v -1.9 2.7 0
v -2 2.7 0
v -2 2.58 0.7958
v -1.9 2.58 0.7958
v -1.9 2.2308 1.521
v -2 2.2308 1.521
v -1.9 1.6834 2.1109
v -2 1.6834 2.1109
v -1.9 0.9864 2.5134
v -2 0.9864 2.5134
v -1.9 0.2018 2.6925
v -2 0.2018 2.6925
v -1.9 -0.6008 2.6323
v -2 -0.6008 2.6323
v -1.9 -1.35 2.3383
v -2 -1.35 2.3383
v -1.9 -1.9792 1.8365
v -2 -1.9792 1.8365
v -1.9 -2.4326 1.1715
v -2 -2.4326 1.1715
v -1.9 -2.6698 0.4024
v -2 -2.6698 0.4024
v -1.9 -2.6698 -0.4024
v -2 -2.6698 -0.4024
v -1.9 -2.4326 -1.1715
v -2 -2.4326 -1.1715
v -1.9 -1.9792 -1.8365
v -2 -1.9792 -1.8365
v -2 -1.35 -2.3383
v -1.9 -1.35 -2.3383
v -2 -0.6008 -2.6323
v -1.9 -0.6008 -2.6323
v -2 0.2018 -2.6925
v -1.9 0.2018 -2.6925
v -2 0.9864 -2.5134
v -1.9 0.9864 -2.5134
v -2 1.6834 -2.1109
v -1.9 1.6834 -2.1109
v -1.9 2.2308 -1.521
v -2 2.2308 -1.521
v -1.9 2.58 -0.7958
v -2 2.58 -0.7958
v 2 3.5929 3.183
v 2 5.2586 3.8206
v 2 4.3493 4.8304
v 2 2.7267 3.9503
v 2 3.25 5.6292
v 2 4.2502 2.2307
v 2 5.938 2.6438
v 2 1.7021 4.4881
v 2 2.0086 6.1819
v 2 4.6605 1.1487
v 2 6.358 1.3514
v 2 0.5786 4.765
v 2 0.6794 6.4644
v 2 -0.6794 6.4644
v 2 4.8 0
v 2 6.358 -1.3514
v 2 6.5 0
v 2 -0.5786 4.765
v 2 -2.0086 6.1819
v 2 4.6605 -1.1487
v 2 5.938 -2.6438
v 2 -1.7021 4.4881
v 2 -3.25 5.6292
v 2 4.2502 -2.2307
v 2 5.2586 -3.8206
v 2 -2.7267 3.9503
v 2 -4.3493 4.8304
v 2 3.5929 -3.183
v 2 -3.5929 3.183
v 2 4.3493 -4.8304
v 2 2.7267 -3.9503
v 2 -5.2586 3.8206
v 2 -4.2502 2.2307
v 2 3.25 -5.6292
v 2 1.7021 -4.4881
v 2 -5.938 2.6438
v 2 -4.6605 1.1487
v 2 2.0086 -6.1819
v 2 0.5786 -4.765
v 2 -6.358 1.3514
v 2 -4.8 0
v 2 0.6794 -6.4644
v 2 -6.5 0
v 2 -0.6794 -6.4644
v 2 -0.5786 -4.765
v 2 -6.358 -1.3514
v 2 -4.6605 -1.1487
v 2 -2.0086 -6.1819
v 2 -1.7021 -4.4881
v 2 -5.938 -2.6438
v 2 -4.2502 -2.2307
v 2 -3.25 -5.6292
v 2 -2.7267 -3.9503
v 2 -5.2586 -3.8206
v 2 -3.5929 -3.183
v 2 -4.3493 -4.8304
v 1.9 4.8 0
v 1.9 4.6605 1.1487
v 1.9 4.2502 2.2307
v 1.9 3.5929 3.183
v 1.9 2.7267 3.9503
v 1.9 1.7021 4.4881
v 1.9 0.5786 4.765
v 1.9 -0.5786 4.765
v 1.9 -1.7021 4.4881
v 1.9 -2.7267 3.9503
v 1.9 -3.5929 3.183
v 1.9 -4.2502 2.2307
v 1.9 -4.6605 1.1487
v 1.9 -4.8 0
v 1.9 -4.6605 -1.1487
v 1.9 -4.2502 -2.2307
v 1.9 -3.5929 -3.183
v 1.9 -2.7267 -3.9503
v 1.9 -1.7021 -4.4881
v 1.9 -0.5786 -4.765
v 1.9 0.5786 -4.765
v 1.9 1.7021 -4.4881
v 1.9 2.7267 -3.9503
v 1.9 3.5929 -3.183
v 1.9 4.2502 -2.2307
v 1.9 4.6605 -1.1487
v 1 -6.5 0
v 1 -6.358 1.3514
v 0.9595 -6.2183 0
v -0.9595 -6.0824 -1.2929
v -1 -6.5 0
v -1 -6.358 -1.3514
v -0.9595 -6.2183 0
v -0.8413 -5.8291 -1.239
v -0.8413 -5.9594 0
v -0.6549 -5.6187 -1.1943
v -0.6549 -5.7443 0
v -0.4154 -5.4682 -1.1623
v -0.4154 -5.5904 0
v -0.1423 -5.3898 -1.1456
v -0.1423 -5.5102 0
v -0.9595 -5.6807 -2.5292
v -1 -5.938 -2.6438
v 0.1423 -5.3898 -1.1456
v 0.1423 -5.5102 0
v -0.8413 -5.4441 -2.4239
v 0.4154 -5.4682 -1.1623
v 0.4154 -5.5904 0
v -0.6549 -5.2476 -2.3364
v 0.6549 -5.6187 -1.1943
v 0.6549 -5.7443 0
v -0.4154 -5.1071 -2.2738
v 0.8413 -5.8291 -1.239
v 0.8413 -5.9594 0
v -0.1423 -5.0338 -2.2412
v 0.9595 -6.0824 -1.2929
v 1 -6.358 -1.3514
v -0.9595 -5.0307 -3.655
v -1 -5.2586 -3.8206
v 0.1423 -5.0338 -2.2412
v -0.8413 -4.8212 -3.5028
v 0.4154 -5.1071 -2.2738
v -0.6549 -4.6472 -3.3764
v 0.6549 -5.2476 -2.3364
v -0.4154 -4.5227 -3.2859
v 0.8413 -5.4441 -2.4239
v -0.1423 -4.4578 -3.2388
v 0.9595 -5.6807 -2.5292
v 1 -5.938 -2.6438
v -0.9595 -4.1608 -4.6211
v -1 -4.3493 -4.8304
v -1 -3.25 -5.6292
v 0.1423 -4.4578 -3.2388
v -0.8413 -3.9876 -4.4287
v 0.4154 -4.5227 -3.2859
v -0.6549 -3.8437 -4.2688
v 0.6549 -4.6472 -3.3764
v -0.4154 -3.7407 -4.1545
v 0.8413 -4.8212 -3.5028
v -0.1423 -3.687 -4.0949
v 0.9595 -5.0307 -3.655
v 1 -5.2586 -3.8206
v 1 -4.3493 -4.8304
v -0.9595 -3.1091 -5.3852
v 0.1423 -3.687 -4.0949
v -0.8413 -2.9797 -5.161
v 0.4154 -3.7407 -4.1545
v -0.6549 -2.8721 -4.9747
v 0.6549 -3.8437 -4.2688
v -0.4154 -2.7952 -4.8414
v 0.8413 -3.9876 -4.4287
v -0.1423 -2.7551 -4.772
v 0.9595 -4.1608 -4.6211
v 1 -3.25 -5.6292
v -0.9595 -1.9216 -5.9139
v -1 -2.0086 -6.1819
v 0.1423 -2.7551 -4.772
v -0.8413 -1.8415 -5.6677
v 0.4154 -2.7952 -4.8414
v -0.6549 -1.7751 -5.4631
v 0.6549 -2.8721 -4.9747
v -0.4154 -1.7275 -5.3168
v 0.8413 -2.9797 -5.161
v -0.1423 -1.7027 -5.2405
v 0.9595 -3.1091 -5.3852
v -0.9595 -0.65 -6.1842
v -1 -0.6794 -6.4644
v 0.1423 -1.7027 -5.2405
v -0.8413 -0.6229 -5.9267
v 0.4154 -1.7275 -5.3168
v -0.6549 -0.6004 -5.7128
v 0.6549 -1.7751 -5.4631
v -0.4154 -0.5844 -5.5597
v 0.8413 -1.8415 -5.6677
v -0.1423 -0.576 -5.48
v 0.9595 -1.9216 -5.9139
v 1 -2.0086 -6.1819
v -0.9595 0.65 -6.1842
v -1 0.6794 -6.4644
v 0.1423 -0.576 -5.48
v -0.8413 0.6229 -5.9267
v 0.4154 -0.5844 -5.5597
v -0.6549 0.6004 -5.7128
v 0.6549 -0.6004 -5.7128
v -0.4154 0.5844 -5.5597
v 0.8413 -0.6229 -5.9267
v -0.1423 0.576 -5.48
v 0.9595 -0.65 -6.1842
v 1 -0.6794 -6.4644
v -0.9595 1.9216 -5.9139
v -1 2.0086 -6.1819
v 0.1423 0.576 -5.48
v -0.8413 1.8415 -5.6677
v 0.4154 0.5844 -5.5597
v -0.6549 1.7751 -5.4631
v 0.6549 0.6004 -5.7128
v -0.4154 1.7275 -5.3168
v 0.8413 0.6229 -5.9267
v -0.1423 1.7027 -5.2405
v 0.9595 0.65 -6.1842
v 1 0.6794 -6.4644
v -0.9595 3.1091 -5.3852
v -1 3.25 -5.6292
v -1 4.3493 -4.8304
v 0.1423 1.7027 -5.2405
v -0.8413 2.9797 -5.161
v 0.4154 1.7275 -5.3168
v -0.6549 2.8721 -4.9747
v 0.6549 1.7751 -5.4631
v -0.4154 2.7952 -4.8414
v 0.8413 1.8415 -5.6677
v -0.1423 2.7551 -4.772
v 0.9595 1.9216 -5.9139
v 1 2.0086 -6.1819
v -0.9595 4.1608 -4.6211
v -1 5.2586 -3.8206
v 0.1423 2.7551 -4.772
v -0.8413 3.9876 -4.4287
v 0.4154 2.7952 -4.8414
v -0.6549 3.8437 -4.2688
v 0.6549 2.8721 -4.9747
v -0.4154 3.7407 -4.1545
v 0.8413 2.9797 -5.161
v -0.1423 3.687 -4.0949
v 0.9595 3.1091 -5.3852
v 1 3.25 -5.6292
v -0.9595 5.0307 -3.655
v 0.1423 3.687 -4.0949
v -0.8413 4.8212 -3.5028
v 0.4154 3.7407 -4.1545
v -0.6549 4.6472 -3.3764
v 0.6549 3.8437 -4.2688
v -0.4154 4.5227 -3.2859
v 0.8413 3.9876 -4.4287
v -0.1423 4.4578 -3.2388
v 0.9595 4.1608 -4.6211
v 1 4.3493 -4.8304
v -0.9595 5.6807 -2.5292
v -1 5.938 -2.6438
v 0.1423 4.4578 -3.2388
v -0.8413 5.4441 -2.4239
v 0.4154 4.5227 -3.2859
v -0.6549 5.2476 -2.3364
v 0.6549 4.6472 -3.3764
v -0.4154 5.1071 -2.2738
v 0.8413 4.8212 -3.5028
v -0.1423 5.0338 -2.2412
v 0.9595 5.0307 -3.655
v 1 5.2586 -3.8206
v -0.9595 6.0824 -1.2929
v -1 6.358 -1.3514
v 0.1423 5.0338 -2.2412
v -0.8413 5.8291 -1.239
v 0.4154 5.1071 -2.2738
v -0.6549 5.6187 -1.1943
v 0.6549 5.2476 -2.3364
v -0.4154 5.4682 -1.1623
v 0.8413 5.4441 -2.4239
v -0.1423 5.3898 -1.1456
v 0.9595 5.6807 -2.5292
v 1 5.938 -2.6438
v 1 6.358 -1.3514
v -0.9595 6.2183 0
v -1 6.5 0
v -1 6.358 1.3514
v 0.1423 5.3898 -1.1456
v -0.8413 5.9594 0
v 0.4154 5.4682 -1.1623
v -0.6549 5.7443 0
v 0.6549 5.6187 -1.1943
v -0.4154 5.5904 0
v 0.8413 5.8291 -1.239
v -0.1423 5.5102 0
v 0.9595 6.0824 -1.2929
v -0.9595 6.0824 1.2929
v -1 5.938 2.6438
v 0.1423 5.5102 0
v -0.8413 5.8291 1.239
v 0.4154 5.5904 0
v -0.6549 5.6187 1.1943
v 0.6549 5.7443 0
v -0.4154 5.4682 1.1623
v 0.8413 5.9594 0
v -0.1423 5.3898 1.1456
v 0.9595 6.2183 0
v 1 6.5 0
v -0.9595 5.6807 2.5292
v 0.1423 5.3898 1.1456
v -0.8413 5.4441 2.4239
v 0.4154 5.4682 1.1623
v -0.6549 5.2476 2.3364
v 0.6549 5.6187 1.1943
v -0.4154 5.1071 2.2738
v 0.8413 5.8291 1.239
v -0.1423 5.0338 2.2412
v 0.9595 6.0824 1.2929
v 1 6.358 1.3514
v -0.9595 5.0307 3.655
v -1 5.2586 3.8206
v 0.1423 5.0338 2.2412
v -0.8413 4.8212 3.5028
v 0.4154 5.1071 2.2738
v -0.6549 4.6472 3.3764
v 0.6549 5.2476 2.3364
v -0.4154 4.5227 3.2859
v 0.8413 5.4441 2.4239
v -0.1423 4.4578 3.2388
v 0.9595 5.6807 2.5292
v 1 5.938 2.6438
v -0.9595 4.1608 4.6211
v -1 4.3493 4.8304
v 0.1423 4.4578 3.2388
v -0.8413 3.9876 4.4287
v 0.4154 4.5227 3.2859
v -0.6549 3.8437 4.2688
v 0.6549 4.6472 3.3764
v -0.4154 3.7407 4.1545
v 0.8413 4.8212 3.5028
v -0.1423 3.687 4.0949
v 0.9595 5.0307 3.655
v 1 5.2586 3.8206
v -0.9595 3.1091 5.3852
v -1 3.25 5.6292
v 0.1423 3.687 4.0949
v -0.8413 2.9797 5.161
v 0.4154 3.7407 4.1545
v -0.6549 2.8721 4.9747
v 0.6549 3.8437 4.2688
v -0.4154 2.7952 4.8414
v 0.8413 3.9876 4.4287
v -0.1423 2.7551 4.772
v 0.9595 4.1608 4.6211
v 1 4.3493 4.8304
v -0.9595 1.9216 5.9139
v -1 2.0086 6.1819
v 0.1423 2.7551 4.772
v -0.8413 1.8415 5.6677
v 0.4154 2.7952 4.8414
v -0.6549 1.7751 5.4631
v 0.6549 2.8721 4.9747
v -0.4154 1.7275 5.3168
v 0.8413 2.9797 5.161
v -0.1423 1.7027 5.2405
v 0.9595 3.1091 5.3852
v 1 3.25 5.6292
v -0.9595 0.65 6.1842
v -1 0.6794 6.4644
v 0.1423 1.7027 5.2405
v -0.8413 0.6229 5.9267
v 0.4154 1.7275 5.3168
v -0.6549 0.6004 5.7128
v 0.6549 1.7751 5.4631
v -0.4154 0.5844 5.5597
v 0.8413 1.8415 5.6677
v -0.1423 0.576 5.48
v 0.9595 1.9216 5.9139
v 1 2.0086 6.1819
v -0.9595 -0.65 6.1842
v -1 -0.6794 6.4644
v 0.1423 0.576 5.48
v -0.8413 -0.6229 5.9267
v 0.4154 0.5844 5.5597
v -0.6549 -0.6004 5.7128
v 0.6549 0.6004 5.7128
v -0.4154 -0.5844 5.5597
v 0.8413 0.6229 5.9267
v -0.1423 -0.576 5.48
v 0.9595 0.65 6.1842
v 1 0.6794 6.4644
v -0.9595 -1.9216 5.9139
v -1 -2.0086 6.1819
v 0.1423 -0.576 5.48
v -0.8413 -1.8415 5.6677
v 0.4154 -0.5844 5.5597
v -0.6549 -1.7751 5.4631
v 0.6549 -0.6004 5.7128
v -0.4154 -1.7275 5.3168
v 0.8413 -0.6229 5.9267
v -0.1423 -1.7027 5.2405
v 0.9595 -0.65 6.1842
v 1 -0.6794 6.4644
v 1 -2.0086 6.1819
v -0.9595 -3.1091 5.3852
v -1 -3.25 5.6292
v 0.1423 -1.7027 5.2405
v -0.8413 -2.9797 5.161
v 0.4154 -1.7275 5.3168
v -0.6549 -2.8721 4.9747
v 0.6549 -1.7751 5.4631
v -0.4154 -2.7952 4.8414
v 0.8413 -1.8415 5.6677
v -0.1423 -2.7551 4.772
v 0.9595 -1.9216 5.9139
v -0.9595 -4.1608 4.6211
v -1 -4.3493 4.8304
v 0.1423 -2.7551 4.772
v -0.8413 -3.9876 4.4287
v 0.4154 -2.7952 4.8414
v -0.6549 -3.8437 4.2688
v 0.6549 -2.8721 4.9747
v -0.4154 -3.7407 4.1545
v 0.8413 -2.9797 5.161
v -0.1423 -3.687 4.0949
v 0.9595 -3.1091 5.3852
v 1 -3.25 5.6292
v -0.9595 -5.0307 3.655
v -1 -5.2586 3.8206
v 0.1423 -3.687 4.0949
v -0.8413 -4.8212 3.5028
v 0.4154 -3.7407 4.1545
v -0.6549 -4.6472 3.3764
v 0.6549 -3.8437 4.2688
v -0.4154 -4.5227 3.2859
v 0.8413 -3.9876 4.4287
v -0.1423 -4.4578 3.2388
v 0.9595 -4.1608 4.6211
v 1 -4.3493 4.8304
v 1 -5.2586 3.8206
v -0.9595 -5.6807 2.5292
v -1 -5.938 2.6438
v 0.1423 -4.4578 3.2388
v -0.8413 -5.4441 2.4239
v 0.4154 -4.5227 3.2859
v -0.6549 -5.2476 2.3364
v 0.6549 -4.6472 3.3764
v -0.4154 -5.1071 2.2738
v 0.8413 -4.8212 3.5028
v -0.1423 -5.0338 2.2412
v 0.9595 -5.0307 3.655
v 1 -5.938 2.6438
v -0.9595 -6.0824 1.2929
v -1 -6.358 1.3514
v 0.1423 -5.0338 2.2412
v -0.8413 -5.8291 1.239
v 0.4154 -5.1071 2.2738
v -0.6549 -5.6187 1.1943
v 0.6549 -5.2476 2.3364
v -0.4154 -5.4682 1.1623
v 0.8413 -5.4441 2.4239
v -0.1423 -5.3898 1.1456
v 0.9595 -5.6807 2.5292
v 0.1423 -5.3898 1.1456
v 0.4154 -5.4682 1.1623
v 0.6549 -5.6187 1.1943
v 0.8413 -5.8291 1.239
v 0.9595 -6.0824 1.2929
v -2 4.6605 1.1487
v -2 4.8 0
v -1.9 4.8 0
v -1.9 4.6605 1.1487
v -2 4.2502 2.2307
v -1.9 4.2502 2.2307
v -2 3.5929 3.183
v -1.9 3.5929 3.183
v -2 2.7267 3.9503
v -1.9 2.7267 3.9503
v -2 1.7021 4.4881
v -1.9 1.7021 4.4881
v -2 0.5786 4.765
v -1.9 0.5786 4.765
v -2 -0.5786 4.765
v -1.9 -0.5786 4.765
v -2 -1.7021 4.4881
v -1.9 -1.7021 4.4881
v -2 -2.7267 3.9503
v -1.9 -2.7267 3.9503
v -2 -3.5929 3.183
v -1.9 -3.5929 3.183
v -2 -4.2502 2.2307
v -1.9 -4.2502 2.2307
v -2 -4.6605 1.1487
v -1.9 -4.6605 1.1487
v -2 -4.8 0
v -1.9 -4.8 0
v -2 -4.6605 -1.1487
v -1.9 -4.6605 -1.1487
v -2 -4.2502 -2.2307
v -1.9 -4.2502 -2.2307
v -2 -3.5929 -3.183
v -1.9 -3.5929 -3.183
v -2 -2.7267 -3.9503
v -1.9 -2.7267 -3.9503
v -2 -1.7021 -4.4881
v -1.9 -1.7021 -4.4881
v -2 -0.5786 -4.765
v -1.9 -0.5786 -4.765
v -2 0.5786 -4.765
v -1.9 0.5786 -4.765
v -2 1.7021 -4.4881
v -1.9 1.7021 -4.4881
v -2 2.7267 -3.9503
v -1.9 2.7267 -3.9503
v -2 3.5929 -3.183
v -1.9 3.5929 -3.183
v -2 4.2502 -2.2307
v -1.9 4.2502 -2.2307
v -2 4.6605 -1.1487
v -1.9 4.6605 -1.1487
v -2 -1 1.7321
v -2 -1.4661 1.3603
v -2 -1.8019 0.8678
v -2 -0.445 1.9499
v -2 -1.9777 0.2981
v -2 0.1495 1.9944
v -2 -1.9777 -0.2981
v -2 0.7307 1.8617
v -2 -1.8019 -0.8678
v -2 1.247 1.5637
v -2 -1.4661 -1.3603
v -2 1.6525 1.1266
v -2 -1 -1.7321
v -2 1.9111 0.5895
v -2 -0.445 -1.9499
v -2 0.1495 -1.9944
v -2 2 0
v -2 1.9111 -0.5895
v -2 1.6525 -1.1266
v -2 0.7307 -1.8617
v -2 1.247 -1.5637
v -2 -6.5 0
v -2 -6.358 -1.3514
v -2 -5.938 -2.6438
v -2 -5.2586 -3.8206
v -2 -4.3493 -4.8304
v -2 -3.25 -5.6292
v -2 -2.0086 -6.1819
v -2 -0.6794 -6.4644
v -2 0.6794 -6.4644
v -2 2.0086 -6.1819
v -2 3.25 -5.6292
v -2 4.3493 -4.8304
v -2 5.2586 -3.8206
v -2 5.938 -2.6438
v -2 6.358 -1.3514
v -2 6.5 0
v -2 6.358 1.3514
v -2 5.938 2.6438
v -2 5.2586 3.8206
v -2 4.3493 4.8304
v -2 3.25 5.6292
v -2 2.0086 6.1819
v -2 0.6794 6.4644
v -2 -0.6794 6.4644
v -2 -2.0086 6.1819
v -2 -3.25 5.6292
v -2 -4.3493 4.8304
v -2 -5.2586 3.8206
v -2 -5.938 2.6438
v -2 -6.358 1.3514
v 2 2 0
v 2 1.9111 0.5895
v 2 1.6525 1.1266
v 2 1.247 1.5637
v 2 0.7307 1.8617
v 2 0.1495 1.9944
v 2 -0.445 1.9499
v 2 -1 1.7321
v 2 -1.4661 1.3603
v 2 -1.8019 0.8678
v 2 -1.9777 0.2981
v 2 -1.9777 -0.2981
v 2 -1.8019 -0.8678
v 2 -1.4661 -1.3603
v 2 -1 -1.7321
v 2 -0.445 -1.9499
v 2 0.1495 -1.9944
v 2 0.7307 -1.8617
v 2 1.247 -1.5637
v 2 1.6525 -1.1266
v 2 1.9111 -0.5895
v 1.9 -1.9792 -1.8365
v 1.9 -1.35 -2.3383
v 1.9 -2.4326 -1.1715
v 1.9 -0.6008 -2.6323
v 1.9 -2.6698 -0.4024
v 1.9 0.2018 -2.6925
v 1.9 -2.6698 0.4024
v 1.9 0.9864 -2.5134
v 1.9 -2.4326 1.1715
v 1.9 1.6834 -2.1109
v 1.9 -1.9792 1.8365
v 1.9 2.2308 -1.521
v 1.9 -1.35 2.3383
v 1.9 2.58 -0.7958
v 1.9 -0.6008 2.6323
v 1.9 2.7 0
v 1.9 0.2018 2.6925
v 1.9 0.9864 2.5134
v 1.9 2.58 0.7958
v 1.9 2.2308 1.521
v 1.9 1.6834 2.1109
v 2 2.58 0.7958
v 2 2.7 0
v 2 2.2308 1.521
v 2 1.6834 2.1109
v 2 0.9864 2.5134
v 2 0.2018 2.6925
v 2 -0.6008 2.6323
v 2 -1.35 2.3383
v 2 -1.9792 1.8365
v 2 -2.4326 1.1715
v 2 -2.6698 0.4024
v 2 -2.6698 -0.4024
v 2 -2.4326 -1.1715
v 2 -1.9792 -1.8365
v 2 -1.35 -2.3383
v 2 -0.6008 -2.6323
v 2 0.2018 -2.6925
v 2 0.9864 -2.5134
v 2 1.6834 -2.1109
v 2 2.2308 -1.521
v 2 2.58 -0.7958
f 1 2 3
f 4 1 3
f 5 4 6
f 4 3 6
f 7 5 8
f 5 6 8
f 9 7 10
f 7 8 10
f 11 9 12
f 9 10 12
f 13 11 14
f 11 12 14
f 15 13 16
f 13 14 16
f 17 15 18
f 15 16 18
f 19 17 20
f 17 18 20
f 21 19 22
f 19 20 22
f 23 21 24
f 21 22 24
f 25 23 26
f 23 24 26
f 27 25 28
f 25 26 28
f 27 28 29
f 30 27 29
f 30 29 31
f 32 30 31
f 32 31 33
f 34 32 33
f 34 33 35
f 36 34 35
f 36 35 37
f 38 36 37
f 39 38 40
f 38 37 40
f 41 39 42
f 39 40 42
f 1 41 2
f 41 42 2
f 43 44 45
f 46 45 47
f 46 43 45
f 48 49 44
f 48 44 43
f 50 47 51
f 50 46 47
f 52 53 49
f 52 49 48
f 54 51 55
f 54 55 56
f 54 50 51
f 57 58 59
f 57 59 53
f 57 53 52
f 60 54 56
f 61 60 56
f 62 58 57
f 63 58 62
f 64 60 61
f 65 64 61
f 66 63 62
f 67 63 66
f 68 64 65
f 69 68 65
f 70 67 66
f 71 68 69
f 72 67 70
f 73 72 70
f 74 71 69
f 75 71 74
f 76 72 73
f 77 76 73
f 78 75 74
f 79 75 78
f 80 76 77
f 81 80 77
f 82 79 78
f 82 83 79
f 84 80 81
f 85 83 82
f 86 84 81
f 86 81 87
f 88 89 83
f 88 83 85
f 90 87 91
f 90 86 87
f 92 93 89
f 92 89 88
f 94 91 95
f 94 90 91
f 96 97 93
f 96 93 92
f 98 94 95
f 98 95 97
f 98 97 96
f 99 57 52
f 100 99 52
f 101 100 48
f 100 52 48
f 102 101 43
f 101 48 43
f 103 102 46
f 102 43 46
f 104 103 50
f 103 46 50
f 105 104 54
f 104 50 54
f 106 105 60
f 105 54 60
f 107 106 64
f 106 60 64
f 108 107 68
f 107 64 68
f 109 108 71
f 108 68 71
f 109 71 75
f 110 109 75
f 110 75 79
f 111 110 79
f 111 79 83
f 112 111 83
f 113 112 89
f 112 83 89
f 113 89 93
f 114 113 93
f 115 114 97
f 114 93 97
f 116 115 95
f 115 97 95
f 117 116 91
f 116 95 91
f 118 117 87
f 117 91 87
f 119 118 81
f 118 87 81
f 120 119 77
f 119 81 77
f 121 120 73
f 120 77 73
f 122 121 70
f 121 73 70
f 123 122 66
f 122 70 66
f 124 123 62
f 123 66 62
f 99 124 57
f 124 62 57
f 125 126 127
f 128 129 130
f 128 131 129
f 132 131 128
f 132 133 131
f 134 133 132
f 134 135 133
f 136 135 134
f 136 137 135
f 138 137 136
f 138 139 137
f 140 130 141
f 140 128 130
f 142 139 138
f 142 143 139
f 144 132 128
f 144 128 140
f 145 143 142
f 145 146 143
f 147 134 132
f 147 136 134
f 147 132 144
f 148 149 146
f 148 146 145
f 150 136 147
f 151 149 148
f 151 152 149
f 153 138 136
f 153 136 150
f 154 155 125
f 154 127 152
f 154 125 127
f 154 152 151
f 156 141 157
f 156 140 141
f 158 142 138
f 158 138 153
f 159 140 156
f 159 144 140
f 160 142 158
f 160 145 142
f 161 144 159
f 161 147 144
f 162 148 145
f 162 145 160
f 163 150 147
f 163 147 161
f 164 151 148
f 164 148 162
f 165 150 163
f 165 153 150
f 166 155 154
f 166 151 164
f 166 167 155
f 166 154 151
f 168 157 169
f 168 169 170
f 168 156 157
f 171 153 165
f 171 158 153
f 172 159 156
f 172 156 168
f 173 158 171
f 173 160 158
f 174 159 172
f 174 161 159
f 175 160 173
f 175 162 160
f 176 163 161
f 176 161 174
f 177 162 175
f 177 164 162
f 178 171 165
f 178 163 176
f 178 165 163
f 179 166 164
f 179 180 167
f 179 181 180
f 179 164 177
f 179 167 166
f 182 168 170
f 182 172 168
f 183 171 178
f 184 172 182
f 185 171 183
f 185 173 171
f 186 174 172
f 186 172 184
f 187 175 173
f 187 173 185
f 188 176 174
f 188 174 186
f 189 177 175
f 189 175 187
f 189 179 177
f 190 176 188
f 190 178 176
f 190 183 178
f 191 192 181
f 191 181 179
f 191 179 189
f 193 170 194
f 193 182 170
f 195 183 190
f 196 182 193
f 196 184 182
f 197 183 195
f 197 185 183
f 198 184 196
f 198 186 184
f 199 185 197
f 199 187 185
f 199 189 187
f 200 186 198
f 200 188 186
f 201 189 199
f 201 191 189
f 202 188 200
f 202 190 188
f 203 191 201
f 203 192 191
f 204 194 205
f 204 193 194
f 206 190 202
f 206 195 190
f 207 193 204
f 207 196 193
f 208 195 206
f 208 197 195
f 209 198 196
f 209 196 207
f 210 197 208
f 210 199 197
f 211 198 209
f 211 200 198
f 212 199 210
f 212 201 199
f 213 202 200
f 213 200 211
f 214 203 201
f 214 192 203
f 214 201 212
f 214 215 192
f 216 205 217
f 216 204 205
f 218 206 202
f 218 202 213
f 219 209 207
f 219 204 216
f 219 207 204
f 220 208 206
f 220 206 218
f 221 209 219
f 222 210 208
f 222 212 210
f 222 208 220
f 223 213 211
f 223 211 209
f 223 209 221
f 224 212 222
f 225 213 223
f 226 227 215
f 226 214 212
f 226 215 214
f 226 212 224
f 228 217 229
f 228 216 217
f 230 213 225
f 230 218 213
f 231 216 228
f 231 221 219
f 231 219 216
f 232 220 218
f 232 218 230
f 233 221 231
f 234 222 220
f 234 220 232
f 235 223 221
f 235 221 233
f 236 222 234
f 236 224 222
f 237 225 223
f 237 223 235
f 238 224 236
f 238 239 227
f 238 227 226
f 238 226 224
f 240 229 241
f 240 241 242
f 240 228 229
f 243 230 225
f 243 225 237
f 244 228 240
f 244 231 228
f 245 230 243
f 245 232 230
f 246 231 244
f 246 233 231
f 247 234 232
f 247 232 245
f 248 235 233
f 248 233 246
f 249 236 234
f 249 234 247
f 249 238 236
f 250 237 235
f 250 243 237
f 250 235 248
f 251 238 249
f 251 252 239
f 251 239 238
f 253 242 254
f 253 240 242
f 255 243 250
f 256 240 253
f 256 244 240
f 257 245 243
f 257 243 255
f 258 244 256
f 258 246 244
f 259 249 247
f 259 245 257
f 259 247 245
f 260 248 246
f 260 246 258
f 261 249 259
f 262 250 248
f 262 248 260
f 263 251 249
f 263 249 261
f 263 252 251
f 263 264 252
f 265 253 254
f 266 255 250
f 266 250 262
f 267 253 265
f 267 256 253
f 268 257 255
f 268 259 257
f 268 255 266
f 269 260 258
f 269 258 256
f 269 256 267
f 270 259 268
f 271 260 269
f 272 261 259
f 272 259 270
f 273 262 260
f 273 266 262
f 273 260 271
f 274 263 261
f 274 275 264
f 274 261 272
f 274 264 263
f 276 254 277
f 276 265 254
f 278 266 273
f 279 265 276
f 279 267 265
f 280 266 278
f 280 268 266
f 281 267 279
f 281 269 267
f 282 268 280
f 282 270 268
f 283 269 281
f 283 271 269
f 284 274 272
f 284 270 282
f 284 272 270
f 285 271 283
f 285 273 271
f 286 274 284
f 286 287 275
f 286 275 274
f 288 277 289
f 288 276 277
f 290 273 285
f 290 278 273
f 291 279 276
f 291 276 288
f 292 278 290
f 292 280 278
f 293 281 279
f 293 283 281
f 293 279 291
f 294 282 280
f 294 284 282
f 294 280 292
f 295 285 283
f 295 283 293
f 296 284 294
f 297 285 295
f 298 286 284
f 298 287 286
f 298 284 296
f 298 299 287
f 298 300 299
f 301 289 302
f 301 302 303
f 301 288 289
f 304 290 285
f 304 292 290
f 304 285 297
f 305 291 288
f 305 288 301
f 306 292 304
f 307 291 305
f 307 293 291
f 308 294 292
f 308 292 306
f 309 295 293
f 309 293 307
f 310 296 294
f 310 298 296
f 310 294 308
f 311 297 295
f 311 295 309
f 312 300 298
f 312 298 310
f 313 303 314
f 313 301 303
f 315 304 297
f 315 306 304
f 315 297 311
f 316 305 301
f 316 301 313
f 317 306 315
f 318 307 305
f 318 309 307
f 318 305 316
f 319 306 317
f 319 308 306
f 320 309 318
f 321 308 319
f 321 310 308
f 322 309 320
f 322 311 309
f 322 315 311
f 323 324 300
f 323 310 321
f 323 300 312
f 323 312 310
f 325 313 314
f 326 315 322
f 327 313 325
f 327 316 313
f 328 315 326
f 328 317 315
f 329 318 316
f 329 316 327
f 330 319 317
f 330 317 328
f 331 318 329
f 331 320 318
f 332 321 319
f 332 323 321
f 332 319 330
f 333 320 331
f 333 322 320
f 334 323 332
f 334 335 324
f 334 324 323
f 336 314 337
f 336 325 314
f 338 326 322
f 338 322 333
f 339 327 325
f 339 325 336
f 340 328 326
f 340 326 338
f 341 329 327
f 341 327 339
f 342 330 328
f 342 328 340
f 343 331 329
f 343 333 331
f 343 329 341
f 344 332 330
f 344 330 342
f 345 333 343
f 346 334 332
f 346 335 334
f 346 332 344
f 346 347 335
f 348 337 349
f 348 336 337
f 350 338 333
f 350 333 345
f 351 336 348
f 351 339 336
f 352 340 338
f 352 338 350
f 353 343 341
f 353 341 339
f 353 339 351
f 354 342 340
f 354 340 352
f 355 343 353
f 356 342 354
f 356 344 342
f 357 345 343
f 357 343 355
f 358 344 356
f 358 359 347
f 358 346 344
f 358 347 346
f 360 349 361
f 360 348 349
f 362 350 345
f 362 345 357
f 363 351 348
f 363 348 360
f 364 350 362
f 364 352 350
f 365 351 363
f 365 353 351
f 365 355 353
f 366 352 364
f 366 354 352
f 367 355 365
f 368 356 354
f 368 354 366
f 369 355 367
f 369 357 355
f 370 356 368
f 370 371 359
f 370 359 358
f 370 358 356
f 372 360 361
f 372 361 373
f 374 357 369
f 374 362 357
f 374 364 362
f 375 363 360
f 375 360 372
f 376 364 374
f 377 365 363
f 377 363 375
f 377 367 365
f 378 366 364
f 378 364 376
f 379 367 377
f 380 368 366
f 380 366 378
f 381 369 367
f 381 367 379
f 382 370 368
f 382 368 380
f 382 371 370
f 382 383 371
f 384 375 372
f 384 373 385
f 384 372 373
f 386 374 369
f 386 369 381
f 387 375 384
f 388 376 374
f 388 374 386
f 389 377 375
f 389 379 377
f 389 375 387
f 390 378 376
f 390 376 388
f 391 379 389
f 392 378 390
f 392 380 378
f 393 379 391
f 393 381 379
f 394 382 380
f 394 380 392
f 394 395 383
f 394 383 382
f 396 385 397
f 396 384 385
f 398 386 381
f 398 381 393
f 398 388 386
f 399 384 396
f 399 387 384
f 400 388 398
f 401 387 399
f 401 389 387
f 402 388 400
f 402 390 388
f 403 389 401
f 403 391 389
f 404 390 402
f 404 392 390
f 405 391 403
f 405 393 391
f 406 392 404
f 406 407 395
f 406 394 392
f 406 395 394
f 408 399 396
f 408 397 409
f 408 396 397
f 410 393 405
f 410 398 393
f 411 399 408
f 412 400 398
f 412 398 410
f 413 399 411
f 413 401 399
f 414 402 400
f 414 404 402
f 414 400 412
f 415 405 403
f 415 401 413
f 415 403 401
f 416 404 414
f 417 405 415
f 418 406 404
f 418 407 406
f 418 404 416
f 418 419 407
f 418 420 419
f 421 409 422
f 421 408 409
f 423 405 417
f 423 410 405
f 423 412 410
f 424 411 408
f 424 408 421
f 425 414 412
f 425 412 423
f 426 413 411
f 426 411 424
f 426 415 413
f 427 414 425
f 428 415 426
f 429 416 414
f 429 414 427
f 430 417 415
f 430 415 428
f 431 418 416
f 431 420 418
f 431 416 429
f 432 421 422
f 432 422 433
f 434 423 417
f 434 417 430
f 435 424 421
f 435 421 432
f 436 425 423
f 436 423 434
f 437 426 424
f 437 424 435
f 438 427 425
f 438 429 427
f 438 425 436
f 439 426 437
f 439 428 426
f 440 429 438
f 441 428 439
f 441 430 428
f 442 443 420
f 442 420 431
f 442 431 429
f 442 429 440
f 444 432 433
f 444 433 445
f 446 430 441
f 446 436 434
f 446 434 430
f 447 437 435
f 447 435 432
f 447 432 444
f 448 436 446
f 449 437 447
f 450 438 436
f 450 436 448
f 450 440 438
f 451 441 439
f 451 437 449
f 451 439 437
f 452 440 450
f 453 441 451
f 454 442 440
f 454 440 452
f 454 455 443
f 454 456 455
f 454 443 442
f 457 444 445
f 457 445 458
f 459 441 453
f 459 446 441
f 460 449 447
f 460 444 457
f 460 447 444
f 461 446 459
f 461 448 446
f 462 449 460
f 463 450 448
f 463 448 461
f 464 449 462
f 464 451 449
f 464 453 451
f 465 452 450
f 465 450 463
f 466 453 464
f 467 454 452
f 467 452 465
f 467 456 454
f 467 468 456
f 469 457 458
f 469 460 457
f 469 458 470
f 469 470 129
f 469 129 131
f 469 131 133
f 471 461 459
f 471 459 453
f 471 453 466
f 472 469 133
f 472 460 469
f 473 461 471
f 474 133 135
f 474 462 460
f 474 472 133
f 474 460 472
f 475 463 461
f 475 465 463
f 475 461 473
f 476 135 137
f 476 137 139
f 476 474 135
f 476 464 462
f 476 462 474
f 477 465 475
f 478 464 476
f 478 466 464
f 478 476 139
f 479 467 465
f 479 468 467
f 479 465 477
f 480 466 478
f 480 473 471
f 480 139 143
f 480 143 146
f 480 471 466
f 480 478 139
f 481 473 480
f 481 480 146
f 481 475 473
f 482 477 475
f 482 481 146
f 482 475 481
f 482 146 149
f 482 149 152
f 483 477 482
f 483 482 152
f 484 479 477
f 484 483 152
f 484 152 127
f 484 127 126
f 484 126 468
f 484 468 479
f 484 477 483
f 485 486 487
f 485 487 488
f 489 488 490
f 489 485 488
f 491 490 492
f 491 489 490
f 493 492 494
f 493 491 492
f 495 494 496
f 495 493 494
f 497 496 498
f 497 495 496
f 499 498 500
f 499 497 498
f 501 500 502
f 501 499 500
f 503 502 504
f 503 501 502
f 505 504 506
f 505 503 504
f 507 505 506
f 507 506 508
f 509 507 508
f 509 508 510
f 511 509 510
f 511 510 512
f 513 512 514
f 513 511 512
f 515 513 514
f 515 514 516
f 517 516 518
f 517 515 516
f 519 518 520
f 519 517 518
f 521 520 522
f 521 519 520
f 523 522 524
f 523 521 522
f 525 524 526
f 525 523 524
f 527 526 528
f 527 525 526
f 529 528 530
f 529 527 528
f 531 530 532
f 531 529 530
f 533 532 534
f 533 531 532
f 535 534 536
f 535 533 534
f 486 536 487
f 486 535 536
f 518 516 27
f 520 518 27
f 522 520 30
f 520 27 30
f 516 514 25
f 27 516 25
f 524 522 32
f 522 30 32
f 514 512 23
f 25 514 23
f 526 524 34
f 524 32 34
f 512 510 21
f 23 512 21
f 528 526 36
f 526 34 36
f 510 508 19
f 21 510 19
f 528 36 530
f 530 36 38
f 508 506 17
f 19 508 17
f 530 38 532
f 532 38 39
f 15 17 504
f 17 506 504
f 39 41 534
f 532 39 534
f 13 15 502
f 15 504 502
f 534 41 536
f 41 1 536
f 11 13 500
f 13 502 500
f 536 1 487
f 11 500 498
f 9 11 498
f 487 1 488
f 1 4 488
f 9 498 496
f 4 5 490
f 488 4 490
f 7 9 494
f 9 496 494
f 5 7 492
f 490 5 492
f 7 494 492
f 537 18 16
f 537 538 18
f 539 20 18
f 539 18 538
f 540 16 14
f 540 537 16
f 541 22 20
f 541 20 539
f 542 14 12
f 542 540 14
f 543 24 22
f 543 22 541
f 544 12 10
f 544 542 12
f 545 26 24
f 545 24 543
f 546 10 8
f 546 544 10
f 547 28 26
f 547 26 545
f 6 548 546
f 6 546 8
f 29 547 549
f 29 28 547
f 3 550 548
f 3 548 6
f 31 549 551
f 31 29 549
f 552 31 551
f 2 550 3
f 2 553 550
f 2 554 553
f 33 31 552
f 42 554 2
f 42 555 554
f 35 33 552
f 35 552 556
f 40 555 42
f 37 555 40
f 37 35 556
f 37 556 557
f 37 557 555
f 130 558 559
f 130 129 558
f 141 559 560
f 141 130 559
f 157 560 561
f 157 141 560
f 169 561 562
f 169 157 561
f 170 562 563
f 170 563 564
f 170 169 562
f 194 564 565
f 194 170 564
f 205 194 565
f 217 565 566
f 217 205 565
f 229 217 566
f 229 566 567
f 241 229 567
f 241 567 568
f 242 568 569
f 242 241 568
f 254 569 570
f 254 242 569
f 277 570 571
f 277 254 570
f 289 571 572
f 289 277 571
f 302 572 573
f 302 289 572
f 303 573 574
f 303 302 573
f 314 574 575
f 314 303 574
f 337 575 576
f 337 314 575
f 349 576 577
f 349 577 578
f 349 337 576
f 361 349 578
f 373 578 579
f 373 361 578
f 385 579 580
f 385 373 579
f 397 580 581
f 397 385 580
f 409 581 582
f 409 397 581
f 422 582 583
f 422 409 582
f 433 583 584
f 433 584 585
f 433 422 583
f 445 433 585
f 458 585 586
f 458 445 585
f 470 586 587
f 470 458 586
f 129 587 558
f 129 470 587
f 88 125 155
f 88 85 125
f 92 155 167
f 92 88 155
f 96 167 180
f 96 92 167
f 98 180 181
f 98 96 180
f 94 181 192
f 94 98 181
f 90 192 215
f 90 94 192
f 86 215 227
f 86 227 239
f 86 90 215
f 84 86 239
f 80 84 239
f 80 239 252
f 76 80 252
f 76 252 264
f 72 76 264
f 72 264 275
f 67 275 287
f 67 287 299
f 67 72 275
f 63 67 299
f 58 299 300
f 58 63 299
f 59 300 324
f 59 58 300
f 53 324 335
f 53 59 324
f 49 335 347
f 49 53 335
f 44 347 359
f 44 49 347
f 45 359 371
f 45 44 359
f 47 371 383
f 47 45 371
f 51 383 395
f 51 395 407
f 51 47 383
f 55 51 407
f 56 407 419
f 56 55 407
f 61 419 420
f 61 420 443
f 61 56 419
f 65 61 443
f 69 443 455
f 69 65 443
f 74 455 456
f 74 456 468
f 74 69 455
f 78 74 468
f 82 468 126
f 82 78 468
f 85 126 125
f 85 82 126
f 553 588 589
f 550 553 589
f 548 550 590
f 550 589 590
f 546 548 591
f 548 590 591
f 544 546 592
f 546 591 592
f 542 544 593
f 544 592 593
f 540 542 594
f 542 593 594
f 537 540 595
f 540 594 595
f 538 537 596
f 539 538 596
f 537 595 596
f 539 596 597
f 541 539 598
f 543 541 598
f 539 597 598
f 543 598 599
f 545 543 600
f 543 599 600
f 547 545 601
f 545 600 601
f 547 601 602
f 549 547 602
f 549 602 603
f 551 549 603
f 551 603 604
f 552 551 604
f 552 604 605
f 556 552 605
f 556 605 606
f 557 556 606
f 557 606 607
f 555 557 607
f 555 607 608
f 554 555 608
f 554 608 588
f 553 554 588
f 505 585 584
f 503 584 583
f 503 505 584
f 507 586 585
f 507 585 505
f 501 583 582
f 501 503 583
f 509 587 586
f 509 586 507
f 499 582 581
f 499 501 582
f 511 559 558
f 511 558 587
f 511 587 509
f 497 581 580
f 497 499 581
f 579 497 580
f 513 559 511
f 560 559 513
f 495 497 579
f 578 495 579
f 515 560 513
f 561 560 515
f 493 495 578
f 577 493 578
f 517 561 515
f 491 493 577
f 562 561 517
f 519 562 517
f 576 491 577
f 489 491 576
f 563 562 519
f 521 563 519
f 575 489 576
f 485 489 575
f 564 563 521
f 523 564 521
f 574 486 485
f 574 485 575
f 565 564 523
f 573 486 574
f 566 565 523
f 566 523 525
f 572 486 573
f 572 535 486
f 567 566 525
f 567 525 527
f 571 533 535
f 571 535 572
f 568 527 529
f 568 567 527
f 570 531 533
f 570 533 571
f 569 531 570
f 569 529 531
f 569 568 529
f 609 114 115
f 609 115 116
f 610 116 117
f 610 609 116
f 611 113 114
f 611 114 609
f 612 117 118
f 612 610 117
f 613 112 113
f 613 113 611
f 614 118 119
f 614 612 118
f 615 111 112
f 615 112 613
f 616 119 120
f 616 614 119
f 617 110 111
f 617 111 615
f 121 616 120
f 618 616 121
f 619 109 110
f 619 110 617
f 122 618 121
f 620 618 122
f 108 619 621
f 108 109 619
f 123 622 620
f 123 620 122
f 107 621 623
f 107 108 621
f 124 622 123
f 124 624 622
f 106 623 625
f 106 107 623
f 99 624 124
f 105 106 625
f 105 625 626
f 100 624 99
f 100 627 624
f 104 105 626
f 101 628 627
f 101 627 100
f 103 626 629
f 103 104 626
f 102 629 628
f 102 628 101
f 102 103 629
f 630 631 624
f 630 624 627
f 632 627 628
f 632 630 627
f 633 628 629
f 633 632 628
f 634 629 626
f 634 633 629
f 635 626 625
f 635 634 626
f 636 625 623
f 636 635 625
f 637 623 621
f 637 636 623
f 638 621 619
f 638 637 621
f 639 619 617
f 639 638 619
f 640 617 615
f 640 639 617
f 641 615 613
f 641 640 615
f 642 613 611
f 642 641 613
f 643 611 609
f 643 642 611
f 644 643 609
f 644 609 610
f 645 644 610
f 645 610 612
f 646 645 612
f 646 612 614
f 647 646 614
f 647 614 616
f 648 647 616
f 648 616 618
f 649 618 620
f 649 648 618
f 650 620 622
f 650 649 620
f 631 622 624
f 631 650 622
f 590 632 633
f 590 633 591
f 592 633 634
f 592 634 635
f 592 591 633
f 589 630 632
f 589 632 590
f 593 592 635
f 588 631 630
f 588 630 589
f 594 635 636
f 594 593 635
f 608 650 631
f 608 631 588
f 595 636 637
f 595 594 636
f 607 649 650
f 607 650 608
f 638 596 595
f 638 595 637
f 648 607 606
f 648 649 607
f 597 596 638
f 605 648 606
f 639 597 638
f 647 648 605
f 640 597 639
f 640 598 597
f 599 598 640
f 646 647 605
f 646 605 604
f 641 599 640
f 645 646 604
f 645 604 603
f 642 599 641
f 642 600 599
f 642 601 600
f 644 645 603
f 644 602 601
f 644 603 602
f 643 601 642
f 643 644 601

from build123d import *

# Parameters (mm, degrees)
SKETCH2_R          = 2
CUT_EXTRUDE1_DEPTH = 11.024968828
SKETCH3_R          = 4.8
SKETCH3_R_2        = 2.7
CUT_EXTRUDE2_DEPTH = 0.1


with BuildPart() as part:
    # Sketch1 → Revolve1 (revolve)
    with BuildSketch(Plane.XY, mode=Mode.PRIVATE) as revolve1_sk:
        with BuildLine():
            Line((1, 6.5), (2, 6.5))
            Line((2, 6.5), (2, 0))
            Line((2, 0), (-2, 0))
            Line((-2, 0), (-2, 6.5))
            Line((-2, 6.5), (-1, 6.5))
            ThreePointArc((-1, 6.5), (0, 5.5), (1, 6.5))
        make_face()
    revolve(revolve1_sk.sketch.rotate(Axis((2, 0, 0), (1, 0, 0)), 180), axis=Axis((2, 0, 0), (1, 0, 0)))

    # Sketch2 → Cut-Extrude1 (cut, through all)
    with BuildSketch(Plane(origin=(2, 0, 0), x_dir=(0, 0, -1), z_dir=(1, 0, 0))):
        with Locations(Location((0, 0, 0), (0, 0, 90))):
            Circle(SKETCH2_R)
    extrude(amount=-CUT_EXTRUDE1_DEPTH, mode=Mode.SUBTRACT)

    # Sketch3 → Cut-Extrude2 (cut)
    with BuildSketch(Plane(origin=(2, 0, 0), x_dir=(0, 0, -1), z_dir=(1, 0, 0))):
        with Locations(Location((0, 0, 0), (0, 0, 90))):
            Circle(SKETCH3_R)
        with Locations(Location((0, 0, 0), (0, 0, 90))):
            Circle(SKETCH3_R_2, mode=Mode.SUBTRACT)
    cut_extrude2 = extrude(amount=-CUT_EXTRUDE2_DEPTH, mode=Mode.SUBTRACT)

    # Mirror1: Cut-Extrude2 across plane
    add(cut_extrude2.mirror(Plane(origin=(0, 0, 0), x_dir=(0, 0, 1), z_dir=(1, 0, 0))), mode=Mode.SUBTRACT)


solid = part.part
